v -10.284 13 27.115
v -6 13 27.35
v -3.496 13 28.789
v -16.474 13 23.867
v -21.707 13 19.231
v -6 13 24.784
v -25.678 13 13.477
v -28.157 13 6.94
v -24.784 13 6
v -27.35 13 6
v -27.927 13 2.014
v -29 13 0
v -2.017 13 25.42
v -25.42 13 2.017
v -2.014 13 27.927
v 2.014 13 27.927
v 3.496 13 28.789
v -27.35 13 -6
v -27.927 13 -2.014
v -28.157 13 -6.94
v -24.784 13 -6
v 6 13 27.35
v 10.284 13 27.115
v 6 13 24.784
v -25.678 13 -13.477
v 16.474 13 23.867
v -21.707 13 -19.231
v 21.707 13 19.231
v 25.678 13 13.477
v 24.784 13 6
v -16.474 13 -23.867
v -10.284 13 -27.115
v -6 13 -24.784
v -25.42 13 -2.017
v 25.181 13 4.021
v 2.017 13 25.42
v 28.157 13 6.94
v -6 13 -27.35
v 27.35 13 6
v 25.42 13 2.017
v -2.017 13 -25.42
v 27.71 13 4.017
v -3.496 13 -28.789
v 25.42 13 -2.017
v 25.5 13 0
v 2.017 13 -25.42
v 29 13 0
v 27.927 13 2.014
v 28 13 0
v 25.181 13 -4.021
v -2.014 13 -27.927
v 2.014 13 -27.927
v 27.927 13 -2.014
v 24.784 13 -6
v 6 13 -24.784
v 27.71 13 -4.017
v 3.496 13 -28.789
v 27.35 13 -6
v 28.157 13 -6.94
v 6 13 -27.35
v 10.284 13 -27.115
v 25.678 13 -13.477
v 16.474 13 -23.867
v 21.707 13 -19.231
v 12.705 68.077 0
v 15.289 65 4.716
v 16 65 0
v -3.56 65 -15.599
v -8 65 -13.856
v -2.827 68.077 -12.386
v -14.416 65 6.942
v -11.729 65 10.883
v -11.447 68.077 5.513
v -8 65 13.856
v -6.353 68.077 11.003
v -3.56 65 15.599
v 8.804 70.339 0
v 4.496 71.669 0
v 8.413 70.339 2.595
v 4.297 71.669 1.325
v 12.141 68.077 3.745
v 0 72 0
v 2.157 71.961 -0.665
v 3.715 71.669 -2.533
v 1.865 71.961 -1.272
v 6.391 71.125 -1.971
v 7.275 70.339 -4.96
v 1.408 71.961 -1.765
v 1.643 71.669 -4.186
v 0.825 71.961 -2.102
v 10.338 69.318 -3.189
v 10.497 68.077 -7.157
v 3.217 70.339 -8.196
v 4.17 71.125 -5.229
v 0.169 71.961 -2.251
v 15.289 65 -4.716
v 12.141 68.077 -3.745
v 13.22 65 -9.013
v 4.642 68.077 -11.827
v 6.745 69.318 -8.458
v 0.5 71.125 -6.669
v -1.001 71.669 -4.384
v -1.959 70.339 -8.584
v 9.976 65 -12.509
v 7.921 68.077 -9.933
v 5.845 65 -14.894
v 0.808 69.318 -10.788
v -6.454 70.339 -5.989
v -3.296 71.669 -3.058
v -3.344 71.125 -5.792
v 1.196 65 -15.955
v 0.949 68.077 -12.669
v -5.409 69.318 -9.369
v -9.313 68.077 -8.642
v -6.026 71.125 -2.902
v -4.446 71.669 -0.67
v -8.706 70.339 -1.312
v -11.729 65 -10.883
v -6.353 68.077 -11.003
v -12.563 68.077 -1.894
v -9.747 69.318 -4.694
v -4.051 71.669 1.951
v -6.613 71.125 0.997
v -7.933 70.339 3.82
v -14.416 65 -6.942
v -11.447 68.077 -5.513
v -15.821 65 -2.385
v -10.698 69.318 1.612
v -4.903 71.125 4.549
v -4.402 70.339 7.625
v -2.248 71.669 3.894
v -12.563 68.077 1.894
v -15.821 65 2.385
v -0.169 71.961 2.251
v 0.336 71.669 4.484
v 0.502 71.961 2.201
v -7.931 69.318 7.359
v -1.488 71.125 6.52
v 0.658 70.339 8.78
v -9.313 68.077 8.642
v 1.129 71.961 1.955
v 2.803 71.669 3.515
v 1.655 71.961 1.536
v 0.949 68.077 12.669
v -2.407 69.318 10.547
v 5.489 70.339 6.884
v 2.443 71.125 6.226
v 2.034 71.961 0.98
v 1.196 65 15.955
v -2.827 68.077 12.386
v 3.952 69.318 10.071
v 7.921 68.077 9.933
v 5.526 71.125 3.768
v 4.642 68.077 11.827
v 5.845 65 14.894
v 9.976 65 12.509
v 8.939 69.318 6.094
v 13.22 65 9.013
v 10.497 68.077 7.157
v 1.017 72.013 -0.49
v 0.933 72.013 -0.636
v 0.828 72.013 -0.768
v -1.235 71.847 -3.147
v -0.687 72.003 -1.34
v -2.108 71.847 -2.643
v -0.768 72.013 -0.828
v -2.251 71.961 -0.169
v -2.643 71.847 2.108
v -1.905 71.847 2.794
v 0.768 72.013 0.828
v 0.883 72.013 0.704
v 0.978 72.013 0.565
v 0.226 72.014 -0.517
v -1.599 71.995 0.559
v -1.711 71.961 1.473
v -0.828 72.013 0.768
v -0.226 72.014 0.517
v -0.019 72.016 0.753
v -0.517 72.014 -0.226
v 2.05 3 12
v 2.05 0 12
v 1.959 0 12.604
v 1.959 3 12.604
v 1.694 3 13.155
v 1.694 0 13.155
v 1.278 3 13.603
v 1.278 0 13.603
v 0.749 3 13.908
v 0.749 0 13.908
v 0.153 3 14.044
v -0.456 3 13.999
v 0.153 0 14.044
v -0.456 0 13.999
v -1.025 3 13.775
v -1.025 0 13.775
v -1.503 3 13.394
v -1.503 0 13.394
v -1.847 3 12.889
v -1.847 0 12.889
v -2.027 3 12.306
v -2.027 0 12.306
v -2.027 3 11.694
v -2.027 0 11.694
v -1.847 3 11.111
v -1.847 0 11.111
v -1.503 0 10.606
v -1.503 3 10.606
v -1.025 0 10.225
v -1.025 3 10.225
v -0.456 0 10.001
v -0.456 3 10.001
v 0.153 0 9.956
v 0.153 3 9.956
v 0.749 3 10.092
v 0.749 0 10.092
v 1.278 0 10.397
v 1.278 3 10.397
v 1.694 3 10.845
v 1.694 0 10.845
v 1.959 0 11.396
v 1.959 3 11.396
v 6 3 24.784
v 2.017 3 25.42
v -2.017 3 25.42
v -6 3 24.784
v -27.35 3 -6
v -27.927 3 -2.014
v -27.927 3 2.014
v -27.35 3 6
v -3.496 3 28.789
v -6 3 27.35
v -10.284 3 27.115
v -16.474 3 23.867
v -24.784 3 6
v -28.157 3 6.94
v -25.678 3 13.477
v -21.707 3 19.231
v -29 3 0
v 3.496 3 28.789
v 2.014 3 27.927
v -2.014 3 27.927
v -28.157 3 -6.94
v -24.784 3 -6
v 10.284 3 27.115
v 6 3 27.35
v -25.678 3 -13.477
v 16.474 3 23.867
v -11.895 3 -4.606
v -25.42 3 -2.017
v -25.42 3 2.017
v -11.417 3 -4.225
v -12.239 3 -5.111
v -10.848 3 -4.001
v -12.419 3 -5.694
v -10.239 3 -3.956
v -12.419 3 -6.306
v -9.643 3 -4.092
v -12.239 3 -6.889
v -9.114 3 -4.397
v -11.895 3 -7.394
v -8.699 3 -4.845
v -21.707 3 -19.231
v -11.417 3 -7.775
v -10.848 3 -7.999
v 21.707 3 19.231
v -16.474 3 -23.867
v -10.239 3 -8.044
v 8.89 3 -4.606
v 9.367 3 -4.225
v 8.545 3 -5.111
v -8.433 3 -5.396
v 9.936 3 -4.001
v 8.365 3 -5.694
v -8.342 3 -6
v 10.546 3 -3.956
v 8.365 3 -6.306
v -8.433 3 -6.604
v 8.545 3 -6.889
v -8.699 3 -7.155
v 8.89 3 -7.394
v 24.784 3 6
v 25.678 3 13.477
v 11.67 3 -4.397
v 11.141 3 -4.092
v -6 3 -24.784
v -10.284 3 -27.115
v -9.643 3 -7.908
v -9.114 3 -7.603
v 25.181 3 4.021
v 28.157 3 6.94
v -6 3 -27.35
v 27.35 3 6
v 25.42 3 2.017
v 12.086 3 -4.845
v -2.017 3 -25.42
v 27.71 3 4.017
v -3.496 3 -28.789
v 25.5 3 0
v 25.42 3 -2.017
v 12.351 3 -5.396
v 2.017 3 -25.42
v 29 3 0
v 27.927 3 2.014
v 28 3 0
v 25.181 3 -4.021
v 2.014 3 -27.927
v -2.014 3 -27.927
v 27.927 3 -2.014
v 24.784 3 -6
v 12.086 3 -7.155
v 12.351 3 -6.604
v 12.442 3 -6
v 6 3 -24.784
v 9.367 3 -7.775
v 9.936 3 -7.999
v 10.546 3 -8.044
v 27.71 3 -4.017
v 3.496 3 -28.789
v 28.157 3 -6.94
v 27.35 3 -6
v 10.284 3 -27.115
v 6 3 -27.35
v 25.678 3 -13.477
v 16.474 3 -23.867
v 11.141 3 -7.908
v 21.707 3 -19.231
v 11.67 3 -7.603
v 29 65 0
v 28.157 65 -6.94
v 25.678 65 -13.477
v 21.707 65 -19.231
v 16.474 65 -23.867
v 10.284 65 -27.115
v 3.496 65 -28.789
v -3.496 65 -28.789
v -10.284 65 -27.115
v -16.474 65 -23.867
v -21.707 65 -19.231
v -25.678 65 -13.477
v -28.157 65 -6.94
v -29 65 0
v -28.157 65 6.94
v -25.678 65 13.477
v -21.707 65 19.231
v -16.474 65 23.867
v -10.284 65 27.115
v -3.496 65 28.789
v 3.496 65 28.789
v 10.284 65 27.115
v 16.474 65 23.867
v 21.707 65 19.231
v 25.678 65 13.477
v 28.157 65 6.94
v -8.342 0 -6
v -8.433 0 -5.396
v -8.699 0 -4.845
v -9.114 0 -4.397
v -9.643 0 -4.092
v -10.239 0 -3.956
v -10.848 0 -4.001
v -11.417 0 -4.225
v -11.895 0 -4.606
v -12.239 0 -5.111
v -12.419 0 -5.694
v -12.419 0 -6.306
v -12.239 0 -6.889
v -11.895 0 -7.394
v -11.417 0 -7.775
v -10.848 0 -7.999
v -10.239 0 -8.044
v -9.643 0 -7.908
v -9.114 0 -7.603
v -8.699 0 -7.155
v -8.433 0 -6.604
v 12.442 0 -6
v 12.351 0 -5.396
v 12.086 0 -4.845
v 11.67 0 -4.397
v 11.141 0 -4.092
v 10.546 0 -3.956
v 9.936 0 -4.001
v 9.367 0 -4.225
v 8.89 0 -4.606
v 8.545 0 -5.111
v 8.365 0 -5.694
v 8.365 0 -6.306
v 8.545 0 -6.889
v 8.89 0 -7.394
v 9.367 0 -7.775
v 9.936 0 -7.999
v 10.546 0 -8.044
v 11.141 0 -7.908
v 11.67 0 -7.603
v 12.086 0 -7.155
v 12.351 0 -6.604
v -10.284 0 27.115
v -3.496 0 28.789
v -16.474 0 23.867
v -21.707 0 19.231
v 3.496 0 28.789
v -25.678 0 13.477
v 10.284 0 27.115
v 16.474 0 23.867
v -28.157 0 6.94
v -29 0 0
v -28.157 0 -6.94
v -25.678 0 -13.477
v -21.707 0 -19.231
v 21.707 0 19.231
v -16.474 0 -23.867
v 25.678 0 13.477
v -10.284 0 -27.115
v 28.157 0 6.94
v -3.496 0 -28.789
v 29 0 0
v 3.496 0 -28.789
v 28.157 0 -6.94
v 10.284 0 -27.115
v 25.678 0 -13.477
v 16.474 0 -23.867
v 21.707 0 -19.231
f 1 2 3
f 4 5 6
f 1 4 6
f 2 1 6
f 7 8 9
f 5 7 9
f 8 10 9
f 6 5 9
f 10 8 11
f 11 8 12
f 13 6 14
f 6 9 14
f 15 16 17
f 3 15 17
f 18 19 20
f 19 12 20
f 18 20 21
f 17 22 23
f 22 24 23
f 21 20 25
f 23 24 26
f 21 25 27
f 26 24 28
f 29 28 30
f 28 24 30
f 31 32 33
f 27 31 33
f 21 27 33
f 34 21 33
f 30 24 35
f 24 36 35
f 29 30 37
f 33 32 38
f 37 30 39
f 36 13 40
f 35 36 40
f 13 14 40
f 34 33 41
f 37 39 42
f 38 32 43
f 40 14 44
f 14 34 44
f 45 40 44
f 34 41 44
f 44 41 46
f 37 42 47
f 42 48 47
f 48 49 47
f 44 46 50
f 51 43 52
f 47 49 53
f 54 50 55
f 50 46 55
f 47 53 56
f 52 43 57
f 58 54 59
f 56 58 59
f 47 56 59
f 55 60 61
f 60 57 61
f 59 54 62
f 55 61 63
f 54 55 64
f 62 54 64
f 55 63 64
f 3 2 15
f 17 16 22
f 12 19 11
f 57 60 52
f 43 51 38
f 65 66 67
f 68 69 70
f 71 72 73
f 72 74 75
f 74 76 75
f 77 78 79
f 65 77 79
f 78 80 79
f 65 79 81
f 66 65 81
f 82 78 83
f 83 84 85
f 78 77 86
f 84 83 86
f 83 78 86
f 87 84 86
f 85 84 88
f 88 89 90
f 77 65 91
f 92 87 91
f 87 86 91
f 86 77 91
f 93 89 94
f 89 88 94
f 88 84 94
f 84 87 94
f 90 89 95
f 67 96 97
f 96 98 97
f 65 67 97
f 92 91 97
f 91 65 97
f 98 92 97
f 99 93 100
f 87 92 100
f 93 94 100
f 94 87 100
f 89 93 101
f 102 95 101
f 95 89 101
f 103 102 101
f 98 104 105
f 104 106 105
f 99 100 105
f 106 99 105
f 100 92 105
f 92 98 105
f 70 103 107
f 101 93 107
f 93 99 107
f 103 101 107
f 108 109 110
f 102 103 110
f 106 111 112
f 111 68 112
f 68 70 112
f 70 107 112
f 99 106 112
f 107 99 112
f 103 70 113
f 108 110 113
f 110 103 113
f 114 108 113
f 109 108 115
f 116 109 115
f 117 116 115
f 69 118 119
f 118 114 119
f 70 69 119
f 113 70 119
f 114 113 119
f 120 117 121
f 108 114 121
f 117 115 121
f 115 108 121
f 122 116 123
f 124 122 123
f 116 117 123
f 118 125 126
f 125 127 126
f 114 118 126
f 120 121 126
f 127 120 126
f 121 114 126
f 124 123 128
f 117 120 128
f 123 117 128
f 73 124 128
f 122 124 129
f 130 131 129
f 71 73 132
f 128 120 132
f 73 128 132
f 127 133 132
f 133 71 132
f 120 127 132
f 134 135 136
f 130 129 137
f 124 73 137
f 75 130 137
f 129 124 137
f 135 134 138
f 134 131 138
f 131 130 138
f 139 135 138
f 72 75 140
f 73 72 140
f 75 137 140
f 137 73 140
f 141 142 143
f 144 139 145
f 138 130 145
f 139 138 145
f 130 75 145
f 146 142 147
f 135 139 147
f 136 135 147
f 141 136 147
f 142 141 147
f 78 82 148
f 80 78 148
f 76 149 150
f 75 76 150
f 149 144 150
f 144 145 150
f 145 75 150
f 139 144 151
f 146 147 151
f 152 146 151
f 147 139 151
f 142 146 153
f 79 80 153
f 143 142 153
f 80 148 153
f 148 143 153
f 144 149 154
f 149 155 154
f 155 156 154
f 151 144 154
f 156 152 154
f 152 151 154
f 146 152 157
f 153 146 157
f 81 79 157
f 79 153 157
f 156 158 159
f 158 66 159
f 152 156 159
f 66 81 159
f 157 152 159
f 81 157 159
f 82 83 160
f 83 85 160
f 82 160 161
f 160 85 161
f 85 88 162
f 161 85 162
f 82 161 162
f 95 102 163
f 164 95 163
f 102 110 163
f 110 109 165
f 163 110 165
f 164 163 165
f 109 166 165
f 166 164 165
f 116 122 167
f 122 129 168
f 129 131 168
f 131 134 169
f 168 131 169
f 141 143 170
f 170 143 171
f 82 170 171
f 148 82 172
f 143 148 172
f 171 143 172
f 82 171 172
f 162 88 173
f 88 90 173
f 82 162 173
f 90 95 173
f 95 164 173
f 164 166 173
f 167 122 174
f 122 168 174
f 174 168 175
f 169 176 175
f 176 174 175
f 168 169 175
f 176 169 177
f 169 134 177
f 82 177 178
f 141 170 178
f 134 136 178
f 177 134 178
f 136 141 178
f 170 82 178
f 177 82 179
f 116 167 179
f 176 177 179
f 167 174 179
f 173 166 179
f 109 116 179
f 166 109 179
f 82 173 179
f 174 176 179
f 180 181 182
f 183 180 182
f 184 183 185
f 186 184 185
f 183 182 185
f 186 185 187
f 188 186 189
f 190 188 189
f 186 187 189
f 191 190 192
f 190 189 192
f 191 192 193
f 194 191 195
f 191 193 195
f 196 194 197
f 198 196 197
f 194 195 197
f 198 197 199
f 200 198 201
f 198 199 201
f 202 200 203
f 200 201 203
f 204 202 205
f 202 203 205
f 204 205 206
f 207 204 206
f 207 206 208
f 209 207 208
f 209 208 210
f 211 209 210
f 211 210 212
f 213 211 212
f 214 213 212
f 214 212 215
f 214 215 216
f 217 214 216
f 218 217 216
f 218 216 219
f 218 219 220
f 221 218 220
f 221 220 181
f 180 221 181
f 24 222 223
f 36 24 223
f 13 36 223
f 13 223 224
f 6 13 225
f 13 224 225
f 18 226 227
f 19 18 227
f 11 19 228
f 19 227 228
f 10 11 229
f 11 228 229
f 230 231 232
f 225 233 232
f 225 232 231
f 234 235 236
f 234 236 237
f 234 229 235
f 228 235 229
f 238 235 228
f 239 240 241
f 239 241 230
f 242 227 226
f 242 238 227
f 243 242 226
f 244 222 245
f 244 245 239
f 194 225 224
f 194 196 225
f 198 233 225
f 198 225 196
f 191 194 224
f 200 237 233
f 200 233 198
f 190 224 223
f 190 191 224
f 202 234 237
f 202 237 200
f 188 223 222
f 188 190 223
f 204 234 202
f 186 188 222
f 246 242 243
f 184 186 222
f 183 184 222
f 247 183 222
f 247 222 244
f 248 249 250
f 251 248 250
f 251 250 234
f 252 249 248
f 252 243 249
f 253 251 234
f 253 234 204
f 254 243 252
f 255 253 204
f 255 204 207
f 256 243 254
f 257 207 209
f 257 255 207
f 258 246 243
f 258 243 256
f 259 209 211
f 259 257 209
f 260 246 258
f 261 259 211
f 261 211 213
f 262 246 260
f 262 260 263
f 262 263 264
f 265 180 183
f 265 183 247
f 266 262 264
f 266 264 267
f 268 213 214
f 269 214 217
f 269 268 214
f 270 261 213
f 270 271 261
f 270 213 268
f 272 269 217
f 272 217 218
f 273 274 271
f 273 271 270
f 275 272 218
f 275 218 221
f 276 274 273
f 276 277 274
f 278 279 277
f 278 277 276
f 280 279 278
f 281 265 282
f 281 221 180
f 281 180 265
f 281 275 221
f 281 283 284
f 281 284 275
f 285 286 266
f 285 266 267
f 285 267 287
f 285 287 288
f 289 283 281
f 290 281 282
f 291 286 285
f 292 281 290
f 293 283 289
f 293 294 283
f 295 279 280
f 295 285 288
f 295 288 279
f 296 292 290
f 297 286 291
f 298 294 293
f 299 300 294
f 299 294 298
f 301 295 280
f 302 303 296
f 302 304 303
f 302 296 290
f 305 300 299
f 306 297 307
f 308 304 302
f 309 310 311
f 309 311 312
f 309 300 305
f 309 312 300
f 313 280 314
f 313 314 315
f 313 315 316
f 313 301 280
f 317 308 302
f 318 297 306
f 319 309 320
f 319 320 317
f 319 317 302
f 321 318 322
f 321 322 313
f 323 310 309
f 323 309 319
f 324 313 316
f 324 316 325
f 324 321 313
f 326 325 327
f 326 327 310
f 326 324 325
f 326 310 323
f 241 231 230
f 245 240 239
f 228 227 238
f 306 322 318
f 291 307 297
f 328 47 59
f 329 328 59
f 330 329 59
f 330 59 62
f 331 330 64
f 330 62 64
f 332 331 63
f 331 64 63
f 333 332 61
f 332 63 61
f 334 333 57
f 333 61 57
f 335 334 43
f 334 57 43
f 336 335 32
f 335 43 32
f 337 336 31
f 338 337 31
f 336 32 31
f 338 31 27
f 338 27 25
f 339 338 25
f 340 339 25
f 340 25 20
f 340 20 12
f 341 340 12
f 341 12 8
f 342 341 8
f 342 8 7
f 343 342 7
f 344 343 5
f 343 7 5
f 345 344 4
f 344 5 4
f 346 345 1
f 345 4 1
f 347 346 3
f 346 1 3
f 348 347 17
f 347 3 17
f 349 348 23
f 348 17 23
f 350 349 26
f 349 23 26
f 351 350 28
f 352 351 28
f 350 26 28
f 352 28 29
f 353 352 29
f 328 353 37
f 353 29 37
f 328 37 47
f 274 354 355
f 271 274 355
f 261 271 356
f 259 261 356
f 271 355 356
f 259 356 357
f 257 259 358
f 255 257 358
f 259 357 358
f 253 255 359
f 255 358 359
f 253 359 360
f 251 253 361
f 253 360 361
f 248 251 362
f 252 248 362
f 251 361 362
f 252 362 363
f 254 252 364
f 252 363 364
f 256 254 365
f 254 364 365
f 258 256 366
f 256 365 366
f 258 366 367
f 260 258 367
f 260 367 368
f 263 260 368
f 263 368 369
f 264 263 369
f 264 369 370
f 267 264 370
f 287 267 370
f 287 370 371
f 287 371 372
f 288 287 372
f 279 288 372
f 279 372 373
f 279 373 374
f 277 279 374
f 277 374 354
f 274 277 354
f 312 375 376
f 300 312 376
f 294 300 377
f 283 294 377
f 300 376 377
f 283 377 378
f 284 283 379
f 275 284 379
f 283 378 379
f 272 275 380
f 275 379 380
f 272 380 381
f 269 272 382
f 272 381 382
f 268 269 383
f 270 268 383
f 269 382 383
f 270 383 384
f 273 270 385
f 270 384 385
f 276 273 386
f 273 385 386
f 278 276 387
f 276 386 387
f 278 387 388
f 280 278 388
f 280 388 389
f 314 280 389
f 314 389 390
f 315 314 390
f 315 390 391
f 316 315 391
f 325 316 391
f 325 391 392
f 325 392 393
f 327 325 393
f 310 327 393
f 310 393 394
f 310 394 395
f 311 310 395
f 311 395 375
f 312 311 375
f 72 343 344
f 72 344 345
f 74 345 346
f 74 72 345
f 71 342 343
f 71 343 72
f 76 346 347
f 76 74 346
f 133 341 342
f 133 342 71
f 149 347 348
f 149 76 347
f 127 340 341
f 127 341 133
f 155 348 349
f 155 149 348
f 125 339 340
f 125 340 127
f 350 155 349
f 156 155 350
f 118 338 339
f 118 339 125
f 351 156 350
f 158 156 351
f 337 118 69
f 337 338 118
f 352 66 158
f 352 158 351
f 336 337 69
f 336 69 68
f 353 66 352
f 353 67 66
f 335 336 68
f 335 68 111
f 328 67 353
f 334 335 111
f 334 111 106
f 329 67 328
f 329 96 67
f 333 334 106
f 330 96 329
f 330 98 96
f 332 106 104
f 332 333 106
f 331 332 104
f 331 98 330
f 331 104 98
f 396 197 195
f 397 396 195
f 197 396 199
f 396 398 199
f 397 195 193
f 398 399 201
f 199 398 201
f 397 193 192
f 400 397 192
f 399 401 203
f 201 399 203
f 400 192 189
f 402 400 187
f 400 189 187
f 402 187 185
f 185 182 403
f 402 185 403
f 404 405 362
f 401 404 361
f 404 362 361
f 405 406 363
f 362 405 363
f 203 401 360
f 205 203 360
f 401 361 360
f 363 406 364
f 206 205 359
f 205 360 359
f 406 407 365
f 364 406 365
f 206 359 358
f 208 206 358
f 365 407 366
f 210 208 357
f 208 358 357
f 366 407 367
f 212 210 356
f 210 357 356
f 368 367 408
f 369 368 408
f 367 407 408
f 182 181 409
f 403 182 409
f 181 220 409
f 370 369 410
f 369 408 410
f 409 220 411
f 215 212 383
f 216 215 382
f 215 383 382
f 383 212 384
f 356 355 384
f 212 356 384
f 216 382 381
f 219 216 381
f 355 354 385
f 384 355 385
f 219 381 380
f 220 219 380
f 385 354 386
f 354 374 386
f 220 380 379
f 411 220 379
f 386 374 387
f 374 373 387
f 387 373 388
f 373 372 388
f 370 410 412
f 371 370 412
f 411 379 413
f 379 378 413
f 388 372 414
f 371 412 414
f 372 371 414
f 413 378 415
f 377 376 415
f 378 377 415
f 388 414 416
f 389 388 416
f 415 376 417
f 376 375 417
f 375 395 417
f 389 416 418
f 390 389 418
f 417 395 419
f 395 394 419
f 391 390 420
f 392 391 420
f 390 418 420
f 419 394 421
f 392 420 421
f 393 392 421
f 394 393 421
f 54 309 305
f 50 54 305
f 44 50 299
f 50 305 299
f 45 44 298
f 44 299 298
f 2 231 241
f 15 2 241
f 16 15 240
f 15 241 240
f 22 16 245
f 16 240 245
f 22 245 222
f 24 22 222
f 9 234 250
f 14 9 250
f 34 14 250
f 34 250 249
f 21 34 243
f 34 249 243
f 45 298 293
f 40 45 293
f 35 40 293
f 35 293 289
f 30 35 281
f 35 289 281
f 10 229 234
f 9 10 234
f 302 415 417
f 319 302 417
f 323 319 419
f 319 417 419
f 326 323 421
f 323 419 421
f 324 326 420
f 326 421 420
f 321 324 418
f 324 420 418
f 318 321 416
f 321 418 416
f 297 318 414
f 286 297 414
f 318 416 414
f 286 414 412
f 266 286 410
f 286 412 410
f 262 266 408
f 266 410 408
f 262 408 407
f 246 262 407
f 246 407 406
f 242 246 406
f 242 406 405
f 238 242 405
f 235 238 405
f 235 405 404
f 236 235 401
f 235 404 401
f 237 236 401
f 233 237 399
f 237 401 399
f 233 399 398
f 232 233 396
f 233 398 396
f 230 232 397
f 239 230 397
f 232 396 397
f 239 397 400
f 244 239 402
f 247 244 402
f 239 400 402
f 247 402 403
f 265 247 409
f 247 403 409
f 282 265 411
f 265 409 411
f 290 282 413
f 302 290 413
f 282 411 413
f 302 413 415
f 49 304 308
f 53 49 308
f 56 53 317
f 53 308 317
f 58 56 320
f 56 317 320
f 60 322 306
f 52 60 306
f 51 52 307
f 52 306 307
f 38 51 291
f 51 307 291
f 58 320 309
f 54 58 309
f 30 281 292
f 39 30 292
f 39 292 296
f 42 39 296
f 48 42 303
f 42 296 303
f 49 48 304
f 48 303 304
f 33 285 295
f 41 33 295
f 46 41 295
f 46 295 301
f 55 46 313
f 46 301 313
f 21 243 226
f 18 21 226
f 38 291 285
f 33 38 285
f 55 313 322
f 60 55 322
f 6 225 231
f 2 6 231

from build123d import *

# Parameters (mm, degrees)
SKETCH1_R           = 29
BOSS_EXTRUDE1_DEPTH = 3
BOSS_EXTRUDE2_DEPTH = 10
SKETCH3_R           = 29
BOSS_EXTRUDE3_DEPTH = 52
SKETCH5_R           = 2.05
CUT_EXTRUDE1_DEPTH  = 5


with BuildPart() as part:
    # Sketch1 → Boss-Extrude1 (new body)
    with BuildSketch(Plane(origin=(0, 0, 0), x_dir=(1, 0, 0), z_dir=(0, 1, 0))):
        Circle(SKETCH1_R)
    extrude(amount=BOSS_EXTRUDE1_DEPTH)

    # Sketch2 → Boss-Extrude2 (add)
    with BuildSketch(Plane(origin=(0, 3, 0), x_dir=(1, 0, 0), z_dir=(0, 1, 0))):
        with BuildLine():
            ThreePointArc((-27.349588662, 6), (-28, 0), (-27.349588662, -6))
            Line((-27.349588662, -6), (-24.784067463, -6))
            ThreePointArc((-24.784067463, -6), (-25.5, 0), (-24.784067463, 6))
            Line((-24.784067463, 6), (-27.349588662, 6))
        make_face()
        with BuildLine():
            Line((24.784067463, -6), (27.349588662, -6))
            ThreePointArc((27.349588662, -6), (27.836922267, -3.017574975), (28, 0))
            ThreePointArc((28, 0), (27.836922267, 3.017574975), (27.349588662, 6))
            Line((27.349588662, 6), (24.784067463, 6))
            ThreePointArc((24.784067463, 6), (25.320384281, 3.02128116), (25.5, 0))
            ThreePointArc((25.5, 0), (25.320384281, -3.02128116), (24.784067463, -6))
        make_face()
        with BuildLine():
            Line((-6, -24.784067463), (-6, -27.349588662))
            ThreePointArc((-6, -27.349588662), (0, -28), (6, -27.349588662))
            Line((6, -27.349588662), (6, -24.784067463))
            ThreePointArc((6, -24.784067463), (0, -25.5), (-6, -24.784067463))
        make_face()
        with BuildLine():
            ThreePointArc((6, 27.349588662), (0, 28), (-6, 27.349588662))
            Line((-6, 27.349588662), (-6, 24.784067463))
            ThreePointArc((-6, 24.784067463), (0, 25.5), (6, 24.784067463))
            Line((6, 24.784067463), (6, 27.349588662))
        make_face()
    extrude(amount=BOSS_EXTRUDE2_DEPTH)

    # Sketch3 → Boss-Extrude3 (add)
    with BuildSketch(Plane(origin=(0, 13, 0), x_dir=(1, 0, 0), z_dir=(0, 1, 0))):
        Circle(SKETCH3_R)
    extrude(amount=BOSS_EXTRUDE3_DEPTH)

    # Sketch4 → Revolve1 (revolve)
    with BuildSketch(Plane.XY):
        with BuildLine():
            Line((0, 65), (0, 72))
            ThreePointArc((0, 72), (8.804421669, 70.338678101), (16, 65))
            Line((16, 65), (0, 65))
        make_face()
    revolve(axis=Axis((0, 65, 0), (0, 1, 0)))

    # Sketch5 → Cut-Extrude1 (cut)
    with BuildSketch(Plane.XZ):
        with Locations((0, 12)):
            Circle(SKETCH5_R)
        with Locations((10.392304845, -6)):
            Circle(SKETCH5_R)
        with Locations((-10.392304845, -6)):
            Circle(SKETCH5_R)
    extrude(amount=-CUT_EXTRUDE1_DEPTH, mode=Mode.SUBTRACT)


solid = part.part
